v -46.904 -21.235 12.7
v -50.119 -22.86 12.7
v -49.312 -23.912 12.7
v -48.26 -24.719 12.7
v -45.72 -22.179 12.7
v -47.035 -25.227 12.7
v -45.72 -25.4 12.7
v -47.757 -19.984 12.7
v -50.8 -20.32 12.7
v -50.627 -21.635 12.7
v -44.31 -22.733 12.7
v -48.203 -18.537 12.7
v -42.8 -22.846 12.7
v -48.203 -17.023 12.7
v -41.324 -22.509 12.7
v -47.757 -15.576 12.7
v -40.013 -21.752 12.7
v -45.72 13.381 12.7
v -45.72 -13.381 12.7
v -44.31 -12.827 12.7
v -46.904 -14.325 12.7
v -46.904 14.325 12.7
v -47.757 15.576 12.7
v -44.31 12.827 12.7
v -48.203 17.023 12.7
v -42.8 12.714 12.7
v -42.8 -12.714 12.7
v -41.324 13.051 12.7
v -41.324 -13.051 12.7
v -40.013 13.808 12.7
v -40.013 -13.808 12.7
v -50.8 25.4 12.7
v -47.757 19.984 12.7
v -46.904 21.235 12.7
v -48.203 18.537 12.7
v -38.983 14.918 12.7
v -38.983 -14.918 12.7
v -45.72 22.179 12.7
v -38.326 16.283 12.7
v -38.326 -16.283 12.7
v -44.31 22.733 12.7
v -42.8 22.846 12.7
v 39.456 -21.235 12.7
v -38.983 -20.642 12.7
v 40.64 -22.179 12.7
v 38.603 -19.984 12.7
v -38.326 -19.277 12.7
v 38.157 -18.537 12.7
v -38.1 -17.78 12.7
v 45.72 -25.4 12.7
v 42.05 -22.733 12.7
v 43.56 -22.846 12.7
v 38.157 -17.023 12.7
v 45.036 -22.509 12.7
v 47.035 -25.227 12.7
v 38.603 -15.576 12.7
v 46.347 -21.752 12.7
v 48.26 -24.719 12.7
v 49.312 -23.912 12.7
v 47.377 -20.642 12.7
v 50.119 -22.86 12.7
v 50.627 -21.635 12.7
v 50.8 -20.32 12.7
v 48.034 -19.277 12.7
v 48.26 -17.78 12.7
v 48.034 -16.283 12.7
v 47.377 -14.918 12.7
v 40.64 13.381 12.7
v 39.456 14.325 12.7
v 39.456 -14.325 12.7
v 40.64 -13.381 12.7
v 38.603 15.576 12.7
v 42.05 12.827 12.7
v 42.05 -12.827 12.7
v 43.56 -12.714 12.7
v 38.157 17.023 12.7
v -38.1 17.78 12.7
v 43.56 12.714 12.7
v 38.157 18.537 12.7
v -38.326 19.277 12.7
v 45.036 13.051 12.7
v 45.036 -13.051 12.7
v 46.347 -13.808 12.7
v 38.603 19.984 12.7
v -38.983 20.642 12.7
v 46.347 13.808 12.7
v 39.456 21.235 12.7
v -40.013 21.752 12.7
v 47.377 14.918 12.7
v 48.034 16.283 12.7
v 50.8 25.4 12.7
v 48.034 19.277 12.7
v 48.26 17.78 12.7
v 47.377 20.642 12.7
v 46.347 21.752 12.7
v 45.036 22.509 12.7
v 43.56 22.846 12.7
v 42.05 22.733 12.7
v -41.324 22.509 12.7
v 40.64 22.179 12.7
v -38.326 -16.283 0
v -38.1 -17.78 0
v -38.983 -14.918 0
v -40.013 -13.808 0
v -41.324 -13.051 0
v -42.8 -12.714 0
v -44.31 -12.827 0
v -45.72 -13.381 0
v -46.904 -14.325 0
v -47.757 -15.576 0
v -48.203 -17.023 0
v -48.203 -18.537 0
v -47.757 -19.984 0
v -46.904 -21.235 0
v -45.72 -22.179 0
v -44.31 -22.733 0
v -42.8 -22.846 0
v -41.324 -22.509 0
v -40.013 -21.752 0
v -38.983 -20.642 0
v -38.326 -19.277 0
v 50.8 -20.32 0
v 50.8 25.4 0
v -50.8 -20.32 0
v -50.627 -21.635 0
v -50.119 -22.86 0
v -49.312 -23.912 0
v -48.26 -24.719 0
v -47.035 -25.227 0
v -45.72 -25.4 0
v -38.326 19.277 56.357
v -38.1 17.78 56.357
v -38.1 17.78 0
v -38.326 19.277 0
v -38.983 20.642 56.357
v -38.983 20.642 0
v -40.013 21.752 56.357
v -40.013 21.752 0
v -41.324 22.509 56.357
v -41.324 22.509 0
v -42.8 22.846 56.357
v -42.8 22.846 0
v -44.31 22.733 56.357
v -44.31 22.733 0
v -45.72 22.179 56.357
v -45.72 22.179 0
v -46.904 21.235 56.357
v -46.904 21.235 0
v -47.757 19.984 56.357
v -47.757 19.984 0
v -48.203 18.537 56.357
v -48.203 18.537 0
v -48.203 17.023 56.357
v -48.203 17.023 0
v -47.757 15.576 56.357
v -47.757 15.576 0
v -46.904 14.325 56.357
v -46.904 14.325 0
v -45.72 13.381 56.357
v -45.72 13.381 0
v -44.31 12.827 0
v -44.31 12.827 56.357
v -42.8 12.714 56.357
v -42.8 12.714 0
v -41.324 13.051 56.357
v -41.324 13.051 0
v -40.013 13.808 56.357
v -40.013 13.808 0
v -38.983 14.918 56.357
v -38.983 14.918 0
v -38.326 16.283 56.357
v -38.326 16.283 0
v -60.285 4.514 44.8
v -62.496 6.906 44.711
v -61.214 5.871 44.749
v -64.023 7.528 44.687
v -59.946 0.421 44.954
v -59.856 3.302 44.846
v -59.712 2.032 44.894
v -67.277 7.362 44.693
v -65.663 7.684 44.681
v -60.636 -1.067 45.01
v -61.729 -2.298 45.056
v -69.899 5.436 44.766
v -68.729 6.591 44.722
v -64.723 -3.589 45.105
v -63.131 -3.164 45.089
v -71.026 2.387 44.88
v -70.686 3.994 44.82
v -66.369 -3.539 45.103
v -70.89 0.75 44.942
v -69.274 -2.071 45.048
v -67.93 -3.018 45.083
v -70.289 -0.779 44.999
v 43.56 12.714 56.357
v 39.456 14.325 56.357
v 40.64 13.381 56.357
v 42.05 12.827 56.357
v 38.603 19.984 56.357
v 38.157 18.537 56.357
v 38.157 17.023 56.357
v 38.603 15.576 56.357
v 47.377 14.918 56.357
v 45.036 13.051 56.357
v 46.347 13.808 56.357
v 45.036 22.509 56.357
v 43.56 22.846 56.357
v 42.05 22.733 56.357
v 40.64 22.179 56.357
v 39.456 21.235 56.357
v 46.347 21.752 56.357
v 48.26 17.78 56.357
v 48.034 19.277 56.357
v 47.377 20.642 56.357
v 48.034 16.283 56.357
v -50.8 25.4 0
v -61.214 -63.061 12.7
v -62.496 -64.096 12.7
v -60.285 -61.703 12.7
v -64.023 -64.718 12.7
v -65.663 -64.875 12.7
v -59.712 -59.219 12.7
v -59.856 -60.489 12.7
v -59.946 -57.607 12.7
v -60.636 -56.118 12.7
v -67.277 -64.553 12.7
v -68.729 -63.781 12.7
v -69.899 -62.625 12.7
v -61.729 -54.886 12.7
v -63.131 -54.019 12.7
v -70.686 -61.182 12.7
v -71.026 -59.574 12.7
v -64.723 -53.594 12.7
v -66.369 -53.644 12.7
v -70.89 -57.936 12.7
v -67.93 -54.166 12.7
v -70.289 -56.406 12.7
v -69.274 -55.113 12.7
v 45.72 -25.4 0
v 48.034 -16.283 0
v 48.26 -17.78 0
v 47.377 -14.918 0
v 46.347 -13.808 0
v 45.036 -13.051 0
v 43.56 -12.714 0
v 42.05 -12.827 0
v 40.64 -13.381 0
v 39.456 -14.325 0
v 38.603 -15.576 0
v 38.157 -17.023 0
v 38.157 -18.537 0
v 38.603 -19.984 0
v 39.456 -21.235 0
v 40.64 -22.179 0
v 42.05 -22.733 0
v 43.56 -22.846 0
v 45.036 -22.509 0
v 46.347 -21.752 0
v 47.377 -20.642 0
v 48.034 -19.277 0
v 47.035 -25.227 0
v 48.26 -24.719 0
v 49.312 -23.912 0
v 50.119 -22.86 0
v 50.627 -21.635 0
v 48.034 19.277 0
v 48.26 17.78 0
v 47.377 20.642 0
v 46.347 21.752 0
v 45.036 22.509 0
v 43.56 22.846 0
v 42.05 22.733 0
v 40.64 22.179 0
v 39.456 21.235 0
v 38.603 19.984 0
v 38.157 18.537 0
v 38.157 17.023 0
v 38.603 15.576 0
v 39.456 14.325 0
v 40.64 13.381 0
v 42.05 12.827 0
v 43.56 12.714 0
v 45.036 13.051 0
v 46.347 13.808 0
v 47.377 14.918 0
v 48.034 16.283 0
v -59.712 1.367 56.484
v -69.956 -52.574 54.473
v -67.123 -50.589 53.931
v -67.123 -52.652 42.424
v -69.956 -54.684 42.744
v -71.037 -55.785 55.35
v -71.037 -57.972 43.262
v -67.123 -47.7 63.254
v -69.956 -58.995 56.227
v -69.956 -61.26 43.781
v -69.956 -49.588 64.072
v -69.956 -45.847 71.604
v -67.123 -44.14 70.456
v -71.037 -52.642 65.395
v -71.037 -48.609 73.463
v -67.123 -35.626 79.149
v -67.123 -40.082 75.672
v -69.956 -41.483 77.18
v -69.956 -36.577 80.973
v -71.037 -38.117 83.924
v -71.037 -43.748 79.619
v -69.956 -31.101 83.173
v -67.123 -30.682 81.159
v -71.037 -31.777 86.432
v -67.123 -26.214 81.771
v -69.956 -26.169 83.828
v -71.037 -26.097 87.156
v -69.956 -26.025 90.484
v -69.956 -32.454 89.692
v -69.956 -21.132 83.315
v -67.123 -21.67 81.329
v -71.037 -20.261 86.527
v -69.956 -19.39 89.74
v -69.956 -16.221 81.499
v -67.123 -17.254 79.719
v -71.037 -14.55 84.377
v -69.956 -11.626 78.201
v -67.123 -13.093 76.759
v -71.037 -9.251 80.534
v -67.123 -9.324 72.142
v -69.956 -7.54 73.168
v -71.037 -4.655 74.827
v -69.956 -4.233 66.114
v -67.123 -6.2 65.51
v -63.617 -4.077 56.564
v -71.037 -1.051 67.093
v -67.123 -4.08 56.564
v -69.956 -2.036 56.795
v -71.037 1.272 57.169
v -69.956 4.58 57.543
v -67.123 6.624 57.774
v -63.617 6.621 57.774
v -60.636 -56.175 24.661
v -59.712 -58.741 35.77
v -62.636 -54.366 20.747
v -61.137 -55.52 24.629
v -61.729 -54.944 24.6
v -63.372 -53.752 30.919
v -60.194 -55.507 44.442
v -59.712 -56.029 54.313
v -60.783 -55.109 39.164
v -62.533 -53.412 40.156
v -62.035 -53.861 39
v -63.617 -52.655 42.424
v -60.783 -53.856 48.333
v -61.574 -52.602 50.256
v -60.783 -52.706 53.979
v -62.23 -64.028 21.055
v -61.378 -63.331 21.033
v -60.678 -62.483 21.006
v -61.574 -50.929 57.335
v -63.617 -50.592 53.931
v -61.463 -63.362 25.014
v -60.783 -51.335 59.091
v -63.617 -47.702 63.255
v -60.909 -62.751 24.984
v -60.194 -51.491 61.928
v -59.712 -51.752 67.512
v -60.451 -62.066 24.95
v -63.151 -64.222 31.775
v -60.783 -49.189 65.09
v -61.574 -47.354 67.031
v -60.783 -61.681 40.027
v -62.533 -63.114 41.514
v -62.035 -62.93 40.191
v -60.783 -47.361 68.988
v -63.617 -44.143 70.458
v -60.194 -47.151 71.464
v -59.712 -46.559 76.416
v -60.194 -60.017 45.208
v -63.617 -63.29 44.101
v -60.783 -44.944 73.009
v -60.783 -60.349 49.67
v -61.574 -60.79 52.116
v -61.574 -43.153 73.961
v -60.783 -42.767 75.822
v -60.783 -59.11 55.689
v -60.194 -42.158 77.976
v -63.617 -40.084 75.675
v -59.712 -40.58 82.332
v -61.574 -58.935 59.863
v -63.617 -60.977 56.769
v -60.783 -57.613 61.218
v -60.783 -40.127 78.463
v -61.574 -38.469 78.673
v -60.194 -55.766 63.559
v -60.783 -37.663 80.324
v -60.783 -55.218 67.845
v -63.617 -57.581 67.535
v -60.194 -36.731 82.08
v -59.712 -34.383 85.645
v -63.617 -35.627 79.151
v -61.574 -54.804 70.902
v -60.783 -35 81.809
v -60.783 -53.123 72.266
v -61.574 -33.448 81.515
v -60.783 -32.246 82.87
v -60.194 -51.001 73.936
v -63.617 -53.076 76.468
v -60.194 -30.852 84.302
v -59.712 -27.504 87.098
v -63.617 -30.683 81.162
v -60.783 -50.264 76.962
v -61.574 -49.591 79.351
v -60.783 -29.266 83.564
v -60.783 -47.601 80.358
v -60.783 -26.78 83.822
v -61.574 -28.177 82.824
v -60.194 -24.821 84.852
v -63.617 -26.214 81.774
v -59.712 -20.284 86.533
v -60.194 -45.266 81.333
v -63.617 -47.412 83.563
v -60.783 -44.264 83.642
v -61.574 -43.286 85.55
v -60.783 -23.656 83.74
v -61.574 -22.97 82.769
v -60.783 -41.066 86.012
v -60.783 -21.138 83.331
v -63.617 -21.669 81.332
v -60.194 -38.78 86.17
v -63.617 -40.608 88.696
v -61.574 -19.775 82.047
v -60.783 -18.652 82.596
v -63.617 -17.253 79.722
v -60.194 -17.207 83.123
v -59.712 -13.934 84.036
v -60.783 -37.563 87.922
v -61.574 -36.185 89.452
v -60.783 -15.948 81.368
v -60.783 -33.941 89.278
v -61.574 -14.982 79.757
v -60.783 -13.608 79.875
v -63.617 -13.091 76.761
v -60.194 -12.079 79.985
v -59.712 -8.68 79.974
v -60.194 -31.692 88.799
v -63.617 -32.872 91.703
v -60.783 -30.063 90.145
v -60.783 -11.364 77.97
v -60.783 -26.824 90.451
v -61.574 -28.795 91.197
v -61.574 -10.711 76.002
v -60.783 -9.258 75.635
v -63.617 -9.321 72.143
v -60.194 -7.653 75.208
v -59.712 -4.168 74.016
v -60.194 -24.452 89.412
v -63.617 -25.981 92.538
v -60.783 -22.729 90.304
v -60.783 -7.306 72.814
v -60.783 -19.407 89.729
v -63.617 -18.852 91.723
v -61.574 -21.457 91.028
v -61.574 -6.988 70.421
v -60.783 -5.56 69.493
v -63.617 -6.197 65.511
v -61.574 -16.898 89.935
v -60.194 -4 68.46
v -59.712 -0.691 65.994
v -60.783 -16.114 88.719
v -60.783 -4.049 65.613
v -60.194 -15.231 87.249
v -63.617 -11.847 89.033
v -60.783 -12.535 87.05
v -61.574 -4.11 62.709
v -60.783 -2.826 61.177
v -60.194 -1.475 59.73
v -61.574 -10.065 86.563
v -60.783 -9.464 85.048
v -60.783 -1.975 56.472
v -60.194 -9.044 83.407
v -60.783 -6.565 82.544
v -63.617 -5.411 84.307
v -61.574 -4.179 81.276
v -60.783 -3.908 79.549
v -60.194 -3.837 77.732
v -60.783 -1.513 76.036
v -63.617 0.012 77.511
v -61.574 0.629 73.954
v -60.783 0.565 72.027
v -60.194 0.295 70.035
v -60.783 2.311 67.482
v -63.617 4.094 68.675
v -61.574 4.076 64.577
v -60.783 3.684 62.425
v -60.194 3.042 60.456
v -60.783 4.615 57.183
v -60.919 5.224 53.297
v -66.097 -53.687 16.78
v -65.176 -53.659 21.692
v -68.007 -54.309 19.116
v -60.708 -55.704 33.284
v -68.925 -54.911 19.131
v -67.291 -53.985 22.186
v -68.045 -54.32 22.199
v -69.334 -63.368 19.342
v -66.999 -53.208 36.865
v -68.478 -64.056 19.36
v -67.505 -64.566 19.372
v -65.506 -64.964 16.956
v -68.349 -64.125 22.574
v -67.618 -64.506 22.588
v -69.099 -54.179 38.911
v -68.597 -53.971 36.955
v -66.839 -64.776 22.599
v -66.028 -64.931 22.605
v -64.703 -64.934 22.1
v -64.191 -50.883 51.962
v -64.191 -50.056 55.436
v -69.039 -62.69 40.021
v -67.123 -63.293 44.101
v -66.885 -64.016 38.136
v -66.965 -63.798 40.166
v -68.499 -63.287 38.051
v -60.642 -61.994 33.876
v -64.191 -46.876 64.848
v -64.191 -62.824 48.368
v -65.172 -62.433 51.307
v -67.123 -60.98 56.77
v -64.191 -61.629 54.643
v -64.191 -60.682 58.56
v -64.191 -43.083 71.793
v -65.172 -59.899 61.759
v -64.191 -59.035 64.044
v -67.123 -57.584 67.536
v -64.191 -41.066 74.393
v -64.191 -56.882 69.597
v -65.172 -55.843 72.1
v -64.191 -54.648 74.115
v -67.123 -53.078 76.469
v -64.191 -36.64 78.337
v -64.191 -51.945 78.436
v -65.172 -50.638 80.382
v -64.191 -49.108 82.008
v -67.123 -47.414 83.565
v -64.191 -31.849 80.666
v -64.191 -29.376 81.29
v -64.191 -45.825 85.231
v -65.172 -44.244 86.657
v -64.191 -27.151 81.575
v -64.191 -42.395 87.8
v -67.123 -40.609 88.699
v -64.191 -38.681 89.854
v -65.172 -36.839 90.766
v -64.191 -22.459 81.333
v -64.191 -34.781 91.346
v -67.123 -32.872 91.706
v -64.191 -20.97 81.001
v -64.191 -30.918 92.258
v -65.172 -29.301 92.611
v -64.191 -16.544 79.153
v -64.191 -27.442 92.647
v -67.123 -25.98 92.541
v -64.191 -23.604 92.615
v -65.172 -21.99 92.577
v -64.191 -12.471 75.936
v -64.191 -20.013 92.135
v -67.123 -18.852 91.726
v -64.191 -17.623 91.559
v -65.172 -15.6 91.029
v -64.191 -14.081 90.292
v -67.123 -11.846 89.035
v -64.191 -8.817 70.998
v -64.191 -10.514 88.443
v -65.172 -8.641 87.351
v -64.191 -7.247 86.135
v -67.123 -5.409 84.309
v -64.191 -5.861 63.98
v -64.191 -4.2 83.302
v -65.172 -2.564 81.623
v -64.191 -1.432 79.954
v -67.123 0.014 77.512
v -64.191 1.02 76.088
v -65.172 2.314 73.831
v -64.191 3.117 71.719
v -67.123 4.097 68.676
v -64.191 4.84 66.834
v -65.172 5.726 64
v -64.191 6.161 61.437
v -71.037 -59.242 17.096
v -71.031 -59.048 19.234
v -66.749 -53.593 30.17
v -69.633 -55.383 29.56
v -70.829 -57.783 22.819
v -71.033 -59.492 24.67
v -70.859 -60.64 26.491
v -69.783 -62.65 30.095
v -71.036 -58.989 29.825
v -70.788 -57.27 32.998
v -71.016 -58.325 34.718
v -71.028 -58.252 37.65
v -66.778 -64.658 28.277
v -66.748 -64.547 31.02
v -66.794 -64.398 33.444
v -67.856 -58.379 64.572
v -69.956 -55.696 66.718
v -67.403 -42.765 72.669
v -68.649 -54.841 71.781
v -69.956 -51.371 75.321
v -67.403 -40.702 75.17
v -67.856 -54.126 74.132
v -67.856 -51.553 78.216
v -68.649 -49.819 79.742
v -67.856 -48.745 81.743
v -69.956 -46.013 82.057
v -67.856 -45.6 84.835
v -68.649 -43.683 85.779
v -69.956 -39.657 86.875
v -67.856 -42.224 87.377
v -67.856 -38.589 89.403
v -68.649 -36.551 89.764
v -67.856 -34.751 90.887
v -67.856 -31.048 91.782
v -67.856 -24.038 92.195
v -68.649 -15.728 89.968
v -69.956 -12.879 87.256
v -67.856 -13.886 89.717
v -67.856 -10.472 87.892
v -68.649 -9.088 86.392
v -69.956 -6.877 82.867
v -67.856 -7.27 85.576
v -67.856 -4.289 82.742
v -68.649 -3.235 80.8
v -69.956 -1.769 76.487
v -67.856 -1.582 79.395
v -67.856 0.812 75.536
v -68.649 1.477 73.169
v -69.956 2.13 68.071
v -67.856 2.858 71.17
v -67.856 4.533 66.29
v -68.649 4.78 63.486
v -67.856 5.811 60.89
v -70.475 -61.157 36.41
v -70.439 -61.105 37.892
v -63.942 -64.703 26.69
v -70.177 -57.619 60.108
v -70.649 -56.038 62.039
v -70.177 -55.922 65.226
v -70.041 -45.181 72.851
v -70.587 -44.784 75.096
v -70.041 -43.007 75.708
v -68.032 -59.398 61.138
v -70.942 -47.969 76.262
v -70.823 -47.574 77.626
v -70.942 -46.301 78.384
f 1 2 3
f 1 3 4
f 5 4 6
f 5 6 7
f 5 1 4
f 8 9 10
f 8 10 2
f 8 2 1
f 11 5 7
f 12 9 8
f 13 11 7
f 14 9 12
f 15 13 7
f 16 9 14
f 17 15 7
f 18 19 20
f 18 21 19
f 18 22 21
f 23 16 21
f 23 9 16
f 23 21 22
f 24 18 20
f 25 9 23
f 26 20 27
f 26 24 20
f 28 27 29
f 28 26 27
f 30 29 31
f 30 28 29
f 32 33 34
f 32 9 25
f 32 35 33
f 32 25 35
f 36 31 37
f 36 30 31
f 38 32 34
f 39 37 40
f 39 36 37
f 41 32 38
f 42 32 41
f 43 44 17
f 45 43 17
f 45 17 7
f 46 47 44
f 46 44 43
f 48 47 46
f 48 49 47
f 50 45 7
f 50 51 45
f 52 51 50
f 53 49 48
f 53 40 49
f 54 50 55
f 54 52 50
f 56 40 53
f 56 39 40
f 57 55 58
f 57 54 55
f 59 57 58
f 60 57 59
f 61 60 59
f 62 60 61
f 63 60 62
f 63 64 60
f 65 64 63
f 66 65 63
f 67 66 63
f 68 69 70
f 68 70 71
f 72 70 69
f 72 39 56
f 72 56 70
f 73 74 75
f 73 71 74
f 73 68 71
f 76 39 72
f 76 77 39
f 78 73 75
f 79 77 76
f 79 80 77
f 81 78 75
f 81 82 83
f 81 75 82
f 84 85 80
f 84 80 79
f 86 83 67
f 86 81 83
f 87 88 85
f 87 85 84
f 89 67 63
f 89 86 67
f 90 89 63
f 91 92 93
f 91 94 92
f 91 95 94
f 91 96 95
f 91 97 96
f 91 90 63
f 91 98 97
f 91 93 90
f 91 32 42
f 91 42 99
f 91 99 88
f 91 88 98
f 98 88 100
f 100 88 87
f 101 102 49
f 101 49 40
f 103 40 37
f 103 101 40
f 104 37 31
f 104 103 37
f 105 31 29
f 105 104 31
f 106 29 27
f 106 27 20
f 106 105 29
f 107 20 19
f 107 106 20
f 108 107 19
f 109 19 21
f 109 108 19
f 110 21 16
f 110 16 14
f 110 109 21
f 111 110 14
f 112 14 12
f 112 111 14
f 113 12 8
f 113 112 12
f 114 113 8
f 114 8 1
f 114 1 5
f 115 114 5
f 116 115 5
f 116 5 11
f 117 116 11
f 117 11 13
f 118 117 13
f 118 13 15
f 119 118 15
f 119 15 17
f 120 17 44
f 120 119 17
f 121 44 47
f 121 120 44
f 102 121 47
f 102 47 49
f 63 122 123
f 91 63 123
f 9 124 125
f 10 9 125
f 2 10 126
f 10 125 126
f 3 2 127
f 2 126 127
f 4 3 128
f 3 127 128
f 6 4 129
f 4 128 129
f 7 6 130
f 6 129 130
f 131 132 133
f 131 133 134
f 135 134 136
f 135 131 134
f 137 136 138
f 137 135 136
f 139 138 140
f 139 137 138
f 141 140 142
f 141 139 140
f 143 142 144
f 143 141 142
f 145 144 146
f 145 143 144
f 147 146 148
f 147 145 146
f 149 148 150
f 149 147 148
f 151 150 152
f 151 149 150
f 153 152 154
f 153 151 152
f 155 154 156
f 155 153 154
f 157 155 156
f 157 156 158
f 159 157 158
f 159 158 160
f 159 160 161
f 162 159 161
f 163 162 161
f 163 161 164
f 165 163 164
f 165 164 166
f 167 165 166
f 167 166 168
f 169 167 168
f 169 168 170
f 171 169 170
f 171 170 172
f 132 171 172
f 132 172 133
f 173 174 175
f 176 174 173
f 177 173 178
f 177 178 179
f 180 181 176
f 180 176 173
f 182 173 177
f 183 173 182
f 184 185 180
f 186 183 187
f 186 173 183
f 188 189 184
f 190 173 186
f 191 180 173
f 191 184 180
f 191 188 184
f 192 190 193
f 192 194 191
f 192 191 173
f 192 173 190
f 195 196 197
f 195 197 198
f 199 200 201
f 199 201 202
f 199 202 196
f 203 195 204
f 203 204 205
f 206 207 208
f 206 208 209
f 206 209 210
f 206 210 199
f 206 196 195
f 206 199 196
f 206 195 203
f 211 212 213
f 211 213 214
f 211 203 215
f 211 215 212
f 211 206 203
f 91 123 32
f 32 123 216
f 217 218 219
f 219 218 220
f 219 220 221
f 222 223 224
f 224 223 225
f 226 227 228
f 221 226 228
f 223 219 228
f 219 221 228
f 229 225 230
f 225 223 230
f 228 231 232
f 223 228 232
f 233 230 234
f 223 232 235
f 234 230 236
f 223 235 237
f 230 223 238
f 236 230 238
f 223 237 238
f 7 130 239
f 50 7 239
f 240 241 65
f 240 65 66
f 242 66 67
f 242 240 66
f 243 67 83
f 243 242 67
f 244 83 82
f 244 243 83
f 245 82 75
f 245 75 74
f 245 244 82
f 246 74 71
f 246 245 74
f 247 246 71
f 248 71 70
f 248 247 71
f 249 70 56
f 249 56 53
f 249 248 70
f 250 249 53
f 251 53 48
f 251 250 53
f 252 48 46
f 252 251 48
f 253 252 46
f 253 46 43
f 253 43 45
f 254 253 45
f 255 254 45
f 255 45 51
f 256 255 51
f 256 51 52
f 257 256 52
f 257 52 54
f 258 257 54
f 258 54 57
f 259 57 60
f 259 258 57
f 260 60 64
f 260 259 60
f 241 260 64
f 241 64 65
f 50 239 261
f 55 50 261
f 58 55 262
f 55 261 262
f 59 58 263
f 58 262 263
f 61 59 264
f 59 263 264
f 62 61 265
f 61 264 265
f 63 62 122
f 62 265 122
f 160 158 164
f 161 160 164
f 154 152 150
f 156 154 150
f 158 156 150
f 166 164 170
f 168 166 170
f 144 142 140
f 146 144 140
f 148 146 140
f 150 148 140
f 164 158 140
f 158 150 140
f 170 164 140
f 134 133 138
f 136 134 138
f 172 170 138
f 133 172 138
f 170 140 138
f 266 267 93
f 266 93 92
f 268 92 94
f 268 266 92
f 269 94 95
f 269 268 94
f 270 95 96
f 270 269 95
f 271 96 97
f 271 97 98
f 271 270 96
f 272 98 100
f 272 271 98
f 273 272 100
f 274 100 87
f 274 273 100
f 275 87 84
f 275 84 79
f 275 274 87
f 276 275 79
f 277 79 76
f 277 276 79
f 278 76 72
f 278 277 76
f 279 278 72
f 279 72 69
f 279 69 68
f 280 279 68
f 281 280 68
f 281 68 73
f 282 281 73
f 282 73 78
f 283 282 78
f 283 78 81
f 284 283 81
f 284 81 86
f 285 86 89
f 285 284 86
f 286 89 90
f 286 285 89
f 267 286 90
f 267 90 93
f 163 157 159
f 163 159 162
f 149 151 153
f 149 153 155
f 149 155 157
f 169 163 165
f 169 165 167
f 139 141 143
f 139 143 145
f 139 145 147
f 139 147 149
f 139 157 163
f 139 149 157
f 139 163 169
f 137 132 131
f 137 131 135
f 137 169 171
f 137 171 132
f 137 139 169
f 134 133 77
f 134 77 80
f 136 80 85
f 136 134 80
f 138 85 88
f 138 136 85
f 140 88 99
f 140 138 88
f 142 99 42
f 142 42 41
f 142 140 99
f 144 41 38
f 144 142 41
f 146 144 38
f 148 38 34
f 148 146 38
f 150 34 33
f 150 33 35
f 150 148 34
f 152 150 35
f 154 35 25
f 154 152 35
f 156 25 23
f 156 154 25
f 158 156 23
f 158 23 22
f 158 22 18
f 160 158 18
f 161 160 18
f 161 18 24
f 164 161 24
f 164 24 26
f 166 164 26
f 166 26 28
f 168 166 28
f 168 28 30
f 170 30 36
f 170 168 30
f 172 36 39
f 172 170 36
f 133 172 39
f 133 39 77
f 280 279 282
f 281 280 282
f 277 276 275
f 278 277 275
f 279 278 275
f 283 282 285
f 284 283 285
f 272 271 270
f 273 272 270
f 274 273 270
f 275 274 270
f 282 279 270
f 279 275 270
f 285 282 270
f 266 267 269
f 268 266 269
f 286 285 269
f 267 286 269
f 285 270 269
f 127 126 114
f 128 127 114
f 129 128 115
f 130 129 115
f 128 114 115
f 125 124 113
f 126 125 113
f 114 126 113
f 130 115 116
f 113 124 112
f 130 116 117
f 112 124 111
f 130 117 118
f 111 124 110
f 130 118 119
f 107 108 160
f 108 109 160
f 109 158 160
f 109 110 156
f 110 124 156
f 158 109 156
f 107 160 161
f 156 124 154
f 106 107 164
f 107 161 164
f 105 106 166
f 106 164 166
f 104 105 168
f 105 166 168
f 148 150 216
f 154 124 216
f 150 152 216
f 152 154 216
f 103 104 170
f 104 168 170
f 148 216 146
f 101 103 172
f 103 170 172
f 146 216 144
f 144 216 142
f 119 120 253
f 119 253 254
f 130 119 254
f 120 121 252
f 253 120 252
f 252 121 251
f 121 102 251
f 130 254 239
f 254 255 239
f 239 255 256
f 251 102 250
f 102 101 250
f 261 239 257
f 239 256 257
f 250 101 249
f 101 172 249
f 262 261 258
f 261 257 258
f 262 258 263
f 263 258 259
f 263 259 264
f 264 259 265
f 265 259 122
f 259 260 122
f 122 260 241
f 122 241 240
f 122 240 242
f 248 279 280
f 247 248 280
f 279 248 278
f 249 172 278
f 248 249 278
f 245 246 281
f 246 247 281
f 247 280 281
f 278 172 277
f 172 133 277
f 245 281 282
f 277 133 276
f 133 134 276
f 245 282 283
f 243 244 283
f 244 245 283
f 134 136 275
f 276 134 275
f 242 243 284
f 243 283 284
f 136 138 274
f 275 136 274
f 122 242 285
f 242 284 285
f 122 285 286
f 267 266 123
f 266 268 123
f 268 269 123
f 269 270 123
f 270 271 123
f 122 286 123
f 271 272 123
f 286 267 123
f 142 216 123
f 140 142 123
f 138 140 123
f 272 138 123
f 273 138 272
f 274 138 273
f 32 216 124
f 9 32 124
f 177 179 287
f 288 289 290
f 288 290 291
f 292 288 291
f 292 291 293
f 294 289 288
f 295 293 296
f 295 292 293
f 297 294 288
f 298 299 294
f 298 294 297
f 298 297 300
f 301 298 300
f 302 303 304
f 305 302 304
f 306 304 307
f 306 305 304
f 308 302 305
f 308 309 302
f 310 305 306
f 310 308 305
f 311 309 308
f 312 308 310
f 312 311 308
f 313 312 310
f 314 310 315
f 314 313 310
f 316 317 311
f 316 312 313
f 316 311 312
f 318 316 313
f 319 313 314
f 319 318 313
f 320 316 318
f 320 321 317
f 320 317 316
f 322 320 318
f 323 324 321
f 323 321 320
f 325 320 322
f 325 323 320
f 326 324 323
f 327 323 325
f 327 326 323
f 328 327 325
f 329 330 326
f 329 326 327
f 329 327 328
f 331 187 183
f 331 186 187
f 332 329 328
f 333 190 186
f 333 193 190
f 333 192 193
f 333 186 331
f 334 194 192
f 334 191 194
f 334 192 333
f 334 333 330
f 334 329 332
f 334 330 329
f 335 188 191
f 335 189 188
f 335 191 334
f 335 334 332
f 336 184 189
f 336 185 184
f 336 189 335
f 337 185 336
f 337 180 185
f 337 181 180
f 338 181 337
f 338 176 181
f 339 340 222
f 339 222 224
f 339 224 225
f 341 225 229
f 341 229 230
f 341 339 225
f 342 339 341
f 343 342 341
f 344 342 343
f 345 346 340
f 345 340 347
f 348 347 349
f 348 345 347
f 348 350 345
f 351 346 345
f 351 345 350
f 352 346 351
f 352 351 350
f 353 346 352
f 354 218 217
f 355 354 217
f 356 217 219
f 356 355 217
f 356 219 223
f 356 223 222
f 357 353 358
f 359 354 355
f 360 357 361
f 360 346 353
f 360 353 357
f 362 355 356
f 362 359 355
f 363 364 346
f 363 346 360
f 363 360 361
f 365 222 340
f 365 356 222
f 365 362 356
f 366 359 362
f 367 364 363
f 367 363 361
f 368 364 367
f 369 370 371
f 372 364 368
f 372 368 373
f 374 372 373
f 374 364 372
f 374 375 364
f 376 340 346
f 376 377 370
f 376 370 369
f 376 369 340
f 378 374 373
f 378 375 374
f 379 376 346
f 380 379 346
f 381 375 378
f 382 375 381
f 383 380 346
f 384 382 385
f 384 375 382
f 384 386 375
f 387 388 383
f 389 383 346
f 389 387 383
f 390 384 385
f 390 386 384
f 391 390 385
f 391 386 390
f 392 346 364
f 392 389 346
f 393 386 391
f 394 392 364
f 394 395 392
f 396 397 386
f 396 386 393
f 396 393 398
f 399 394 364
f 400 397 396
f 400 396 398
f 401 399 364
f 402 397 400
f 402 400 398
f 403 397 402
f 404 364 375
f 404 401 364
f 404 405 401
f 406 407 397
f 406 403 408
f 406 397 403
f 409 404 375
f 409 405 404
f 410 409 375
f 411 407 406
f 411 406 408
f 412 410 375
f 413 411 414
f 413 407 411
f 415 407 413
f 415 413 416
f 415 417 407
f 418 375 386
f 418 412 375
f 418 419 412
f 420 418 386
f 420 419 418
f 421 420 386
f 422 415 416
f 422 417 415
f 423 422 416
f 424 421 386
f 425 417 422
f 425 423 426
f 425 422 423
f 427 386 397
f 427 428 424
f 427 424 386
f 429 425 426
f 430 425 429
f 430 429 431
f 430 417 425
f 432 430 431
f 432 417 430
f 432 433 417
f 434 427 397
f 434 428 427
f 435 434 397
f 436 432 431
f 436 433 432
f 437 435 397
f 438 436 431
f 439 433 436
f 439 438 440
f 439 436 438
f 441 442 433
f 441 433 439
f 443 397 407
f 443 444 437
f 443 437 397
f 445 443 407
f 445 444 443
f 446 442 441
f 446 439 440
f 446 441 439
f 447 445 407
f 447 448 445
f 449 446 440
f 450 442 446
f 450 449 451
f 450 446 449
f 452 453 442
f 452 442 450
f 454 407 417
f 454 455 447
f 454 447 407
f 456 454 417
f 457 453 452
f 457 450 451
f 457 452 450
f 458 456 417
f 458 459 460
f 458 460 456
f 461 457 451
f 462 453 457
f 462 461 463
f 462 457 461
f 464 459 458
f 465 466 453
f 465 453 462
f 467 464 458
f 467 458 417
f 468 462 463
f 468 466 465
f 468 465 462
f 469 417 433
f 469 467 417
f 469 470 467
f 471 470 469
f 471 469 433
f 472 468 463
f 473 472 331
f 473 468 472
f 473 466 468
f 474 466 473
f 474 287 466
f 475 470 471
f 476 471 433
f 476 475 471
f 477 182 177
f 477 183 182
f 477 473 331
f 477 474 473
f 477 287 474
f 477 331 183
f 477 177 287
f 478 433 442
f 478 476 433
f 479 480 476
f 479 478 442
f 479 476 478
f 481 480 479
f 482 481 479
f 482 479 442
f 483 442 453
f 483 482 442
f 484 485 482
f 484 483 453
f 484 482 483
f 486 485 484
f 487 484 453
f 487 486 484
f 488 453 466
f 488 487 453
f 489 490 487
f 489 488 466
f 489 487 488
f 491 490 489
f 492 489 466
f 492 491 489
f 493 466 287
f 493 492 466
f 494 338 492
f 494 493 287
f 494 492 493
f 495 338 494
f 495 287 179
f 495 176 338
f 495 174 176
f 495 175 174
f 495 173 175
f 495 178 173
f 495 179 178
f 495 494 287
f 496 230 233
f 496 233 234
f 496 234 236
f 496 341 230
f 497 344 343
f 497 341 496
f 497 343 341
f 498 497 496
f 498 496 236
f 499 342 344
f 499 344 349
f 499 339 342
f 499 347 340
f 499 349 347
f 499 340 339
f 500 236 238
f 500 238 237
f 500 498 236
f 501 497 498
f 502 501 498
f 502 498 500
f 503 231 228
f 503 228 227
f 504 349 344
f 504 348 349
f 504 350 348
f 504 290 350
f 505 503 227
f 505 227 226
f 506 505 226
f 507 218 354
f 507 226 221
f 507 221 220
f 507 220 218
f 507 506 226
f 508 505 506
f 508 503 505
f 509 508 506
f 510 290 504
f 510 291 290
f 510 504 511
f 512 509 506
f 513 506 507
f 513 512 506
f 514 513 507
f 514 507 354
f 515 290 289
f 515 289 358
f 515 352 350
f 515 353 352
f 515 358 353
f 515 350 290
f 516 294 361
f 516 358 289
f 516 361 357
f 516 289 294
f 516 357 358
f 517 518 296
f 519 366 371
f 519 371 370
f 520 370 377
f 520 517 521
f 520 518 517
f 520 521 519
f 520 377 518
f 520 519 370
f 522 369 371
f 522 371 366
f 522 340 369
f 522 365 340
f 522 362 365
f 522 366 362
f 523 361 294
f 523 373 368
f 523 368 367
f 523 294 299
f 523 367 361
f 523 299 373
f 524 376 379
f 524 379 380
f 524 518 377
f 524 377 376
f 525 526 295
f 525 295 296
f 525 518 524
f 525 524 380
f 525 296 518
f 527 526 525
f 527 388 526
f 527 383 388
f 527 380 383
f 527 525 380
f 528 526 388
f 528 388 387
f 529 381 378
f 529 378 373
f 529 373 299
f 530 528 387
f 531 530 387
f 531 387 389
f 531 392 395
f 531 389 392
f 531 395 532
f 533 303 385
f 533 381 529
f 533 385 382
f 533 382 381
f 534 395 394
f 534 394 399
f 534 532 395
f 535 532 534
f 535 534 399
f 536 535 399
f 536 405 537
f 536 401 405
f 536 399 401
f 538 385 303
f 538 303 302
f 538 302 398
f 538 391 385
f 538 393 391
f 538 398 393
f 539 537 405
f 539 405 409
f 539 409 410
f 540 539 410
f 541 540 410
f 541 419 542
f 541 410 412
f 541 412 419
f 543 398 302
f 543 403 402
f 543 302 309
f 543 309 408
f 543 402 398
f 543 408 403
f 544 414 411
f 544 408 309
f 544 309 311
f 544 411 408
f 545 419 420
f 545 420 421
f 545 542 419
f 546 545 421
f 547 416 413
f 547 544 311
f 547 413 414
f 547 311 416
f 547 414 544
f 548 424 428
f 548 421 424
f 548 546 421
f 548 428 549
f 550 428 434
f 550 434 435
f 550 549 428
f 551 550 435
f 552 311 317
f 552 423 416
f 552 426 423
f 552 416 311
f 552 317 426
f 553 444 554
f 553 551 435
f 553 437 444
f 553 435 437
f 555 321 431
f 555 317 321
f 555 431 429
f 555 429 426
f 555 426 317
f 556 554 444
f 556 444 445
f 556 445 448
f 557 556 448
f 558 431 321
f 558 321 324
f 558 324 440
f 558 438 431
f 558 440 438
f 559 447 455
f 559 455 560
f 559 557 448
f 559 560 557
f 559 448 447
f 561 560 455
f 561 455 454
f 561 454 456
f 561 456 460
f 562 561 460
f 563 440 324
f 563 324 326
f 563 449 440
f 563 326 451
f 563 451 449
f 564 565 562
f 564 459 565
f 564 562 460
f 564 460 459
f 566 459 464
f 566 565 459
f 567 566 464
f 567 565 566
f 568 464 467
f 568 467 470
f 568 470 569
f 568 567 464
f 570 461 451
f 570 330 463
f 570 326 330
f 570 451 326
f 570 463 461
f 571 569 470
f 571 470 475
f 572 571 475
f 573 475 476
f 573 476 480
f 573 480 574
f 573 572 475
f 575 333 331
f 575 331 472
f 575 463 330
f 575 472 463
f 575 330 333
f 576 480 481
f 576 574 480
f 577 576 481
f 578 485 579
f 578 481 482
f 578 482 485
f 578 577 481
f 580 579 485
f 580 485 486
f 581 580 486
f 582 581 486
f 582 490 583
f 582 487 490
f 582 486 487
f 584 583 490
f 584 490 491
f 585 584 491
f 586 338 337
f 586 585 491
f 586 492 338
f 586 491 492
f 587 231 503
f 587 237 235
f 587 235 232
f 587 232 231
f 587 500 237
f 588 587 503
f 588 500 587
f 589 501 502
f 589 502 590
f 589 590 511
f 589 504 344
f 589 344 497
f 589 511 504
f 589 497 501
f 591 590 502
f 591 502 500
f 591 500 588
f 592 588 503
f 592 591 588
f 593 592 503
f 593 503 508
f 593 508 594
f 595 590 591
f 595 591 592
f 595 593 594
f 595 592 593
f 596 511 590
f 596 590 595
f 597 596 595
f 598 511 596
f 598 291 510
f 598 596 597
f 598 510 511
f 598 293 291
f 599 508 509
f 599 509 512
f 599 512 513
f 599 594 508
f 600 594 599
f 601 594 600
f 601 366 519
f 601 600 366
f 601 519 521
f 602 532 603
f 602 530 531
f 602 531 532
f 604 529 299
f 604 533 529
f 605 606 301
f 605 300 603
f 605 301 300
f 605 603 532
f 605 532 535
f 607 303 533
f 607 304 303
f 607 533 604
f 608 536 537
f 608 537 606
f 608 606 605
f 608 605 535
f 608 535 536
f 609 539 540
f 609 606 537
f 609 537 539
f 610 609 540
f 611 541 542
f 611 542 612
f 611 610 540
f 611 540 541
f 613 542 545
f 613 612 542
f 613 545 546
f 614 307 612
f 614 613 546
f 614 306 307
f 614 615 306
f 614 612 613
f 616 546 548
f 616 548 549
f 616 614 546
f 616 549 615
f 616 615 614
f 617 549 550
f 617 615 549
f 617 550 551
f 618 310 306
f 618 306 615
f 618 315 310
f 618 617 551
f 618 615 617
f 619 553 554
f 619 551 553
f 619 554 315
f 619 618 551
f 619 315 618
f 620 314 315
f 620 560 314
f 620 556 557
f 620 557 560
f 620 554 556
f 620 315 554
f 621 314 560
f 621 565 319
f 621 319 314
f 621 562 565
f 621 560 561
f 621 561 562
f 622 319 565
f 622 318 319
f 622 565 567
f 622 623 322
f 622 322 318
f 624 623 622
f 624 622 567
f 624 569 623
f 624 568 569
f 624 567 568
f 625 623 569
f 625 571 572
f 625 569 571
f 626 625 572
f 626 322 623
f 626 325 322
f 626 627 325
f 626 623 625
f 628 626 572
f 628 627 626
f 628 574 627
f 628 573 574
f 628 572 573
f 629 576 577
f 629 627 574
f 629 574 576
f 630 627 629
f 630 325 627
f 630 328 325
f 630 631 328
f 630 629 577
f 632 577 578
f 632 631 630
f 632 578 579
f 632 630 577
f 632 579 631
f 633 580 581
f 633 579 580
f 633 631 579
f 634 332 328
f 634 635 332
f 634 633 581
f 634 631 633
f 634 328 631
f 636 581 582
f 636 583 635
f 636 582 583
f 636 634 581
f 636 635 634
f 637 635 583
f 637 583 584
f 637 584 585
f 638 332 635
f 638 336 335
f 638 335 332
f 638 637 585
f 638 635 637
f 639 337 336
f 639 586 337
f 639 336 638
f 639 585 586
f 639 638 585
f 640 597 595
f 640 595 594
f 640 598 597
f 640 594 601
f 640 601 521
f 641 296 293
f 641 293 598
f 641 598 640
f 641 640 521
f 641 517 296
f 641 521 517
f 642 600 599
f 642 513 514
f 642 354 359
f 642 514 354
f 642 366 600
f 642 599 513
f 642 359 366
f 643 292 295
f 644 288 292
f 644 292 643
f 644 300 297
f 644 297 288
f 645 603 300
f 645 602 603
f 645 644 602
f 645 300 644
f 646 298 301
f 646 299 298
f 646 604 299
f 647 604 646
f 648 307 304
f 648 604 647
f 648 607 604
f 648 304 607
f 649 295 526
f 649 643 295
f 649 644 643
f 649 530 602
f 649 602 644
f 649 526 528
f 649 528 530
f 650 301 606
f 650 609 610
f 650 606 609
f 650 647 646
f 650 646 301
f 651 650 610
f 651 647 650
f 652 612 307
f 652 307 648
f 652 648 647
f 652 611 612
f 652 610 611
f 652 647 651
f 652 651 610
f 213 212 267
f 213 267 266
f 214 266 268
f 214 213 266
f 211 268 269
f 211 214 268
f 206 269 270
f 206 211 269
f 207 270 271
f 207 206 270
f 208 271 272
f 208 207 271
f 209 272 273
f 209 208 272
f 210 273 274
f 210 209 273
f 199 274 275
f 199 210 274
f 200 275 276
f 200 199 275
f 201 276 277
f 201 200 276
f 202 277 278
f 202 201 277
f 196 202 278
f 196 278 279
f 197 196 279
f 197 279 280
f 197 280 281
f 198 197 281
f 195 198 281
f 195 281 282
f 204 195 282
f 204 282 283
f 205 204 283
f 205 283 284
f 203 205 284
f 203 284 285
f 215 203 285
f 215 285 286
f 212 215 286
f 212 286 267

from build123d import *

# Parameters (mm, degrees)
F0_R     = 5.08
F1_DEPTH = 12.7
F4_R     = 5.6629201778


with BuildPart() as f1:
    # F0 (on Top) → F1 (new body)
    with BuildSketch(Plane.XY):
        with BuildLine():
            Line((50.8, 25.4), (-50.8, 25.4))
            Line((-50.8, 25.4), (-50.8, -20.32))
            ThreePointArc((-50.8, -20.32), (-49.3121024484, -23.9121024484), (-45.72, -25.4))
            Line((-45.72, -25.4), (45.72, -25.4))
            ThreePointArc((45.72, -25.4), (49.3121024484, -23.9121024484), (50.8, -20.32))
            Line((50.8, -20.32), (50.8, 25.4))
        make_face()
        with Locations((-43.18, -17.78)):
            Circle(F0_R, mode=Mode.SUBTRACT)
        with Locations((43.18, -17.78)):
            Circle(F0_R, mode=Mode.SUBTRACT)
        with Locations((-43.18, 17.78)):
            Circle(F0_R, mode=Mode.SUBTRACT)
        with Locations((43.18, 17.78)):
            Circle(F0_R, mode=Mode.SUBTRACT)
    extrude(amount=F1_DEPTH)


with BuildPart() as f3:
    # F3: sweep along a path in F2
    with BuildLine(Plane(origin=(-50.8, 0, 0), x_dir=(0, -1, 0), z_dir=(-1, 0, 0))) as f3_path:
        Line((-18.5537710786, 12.7), (-18.5537710786, 69.0565630794))
    # F0 (on Top) → F3 (sweep)
    with BuildSketch(Plane.XY):
        with Locations((-43.18, 17.78)):
            Circle(F0_R)
        with Locations((43.18, 17.78)):
            Circle(F0_R)
    sweep(path=f3_path.line)


with BuildPart() as f6:
    # F6: sweep along a path in F5
    with BuildLine(Plane.YZ.offset(50.8)) as f6_path:
        add(Plane.YZ.offset(50.8) * Edge.make_bspline(
            [(-59.1373257339, 12.8902019933), (-60.4012432353, 59.4742599736), (-40.206081369, 100.9540456467), (2.3180330713, 80.6896340972), (1.9432787085, 44.7065606713)],
            knots=[0, 0, 0, 0, 0.5478054325, 1, 1, 1, 1], degree=3))
    # F4 (on face) → F6 (sweep)
    with BuildSketch(Plane.XY.offset(12.7)):
        with Locations((-65.3745085001, -59.219095856)):
            Circle(F4_R)
    sweep(path=f6_path.line)


solid = Compound([f1.part, f3.part, f6.part])
